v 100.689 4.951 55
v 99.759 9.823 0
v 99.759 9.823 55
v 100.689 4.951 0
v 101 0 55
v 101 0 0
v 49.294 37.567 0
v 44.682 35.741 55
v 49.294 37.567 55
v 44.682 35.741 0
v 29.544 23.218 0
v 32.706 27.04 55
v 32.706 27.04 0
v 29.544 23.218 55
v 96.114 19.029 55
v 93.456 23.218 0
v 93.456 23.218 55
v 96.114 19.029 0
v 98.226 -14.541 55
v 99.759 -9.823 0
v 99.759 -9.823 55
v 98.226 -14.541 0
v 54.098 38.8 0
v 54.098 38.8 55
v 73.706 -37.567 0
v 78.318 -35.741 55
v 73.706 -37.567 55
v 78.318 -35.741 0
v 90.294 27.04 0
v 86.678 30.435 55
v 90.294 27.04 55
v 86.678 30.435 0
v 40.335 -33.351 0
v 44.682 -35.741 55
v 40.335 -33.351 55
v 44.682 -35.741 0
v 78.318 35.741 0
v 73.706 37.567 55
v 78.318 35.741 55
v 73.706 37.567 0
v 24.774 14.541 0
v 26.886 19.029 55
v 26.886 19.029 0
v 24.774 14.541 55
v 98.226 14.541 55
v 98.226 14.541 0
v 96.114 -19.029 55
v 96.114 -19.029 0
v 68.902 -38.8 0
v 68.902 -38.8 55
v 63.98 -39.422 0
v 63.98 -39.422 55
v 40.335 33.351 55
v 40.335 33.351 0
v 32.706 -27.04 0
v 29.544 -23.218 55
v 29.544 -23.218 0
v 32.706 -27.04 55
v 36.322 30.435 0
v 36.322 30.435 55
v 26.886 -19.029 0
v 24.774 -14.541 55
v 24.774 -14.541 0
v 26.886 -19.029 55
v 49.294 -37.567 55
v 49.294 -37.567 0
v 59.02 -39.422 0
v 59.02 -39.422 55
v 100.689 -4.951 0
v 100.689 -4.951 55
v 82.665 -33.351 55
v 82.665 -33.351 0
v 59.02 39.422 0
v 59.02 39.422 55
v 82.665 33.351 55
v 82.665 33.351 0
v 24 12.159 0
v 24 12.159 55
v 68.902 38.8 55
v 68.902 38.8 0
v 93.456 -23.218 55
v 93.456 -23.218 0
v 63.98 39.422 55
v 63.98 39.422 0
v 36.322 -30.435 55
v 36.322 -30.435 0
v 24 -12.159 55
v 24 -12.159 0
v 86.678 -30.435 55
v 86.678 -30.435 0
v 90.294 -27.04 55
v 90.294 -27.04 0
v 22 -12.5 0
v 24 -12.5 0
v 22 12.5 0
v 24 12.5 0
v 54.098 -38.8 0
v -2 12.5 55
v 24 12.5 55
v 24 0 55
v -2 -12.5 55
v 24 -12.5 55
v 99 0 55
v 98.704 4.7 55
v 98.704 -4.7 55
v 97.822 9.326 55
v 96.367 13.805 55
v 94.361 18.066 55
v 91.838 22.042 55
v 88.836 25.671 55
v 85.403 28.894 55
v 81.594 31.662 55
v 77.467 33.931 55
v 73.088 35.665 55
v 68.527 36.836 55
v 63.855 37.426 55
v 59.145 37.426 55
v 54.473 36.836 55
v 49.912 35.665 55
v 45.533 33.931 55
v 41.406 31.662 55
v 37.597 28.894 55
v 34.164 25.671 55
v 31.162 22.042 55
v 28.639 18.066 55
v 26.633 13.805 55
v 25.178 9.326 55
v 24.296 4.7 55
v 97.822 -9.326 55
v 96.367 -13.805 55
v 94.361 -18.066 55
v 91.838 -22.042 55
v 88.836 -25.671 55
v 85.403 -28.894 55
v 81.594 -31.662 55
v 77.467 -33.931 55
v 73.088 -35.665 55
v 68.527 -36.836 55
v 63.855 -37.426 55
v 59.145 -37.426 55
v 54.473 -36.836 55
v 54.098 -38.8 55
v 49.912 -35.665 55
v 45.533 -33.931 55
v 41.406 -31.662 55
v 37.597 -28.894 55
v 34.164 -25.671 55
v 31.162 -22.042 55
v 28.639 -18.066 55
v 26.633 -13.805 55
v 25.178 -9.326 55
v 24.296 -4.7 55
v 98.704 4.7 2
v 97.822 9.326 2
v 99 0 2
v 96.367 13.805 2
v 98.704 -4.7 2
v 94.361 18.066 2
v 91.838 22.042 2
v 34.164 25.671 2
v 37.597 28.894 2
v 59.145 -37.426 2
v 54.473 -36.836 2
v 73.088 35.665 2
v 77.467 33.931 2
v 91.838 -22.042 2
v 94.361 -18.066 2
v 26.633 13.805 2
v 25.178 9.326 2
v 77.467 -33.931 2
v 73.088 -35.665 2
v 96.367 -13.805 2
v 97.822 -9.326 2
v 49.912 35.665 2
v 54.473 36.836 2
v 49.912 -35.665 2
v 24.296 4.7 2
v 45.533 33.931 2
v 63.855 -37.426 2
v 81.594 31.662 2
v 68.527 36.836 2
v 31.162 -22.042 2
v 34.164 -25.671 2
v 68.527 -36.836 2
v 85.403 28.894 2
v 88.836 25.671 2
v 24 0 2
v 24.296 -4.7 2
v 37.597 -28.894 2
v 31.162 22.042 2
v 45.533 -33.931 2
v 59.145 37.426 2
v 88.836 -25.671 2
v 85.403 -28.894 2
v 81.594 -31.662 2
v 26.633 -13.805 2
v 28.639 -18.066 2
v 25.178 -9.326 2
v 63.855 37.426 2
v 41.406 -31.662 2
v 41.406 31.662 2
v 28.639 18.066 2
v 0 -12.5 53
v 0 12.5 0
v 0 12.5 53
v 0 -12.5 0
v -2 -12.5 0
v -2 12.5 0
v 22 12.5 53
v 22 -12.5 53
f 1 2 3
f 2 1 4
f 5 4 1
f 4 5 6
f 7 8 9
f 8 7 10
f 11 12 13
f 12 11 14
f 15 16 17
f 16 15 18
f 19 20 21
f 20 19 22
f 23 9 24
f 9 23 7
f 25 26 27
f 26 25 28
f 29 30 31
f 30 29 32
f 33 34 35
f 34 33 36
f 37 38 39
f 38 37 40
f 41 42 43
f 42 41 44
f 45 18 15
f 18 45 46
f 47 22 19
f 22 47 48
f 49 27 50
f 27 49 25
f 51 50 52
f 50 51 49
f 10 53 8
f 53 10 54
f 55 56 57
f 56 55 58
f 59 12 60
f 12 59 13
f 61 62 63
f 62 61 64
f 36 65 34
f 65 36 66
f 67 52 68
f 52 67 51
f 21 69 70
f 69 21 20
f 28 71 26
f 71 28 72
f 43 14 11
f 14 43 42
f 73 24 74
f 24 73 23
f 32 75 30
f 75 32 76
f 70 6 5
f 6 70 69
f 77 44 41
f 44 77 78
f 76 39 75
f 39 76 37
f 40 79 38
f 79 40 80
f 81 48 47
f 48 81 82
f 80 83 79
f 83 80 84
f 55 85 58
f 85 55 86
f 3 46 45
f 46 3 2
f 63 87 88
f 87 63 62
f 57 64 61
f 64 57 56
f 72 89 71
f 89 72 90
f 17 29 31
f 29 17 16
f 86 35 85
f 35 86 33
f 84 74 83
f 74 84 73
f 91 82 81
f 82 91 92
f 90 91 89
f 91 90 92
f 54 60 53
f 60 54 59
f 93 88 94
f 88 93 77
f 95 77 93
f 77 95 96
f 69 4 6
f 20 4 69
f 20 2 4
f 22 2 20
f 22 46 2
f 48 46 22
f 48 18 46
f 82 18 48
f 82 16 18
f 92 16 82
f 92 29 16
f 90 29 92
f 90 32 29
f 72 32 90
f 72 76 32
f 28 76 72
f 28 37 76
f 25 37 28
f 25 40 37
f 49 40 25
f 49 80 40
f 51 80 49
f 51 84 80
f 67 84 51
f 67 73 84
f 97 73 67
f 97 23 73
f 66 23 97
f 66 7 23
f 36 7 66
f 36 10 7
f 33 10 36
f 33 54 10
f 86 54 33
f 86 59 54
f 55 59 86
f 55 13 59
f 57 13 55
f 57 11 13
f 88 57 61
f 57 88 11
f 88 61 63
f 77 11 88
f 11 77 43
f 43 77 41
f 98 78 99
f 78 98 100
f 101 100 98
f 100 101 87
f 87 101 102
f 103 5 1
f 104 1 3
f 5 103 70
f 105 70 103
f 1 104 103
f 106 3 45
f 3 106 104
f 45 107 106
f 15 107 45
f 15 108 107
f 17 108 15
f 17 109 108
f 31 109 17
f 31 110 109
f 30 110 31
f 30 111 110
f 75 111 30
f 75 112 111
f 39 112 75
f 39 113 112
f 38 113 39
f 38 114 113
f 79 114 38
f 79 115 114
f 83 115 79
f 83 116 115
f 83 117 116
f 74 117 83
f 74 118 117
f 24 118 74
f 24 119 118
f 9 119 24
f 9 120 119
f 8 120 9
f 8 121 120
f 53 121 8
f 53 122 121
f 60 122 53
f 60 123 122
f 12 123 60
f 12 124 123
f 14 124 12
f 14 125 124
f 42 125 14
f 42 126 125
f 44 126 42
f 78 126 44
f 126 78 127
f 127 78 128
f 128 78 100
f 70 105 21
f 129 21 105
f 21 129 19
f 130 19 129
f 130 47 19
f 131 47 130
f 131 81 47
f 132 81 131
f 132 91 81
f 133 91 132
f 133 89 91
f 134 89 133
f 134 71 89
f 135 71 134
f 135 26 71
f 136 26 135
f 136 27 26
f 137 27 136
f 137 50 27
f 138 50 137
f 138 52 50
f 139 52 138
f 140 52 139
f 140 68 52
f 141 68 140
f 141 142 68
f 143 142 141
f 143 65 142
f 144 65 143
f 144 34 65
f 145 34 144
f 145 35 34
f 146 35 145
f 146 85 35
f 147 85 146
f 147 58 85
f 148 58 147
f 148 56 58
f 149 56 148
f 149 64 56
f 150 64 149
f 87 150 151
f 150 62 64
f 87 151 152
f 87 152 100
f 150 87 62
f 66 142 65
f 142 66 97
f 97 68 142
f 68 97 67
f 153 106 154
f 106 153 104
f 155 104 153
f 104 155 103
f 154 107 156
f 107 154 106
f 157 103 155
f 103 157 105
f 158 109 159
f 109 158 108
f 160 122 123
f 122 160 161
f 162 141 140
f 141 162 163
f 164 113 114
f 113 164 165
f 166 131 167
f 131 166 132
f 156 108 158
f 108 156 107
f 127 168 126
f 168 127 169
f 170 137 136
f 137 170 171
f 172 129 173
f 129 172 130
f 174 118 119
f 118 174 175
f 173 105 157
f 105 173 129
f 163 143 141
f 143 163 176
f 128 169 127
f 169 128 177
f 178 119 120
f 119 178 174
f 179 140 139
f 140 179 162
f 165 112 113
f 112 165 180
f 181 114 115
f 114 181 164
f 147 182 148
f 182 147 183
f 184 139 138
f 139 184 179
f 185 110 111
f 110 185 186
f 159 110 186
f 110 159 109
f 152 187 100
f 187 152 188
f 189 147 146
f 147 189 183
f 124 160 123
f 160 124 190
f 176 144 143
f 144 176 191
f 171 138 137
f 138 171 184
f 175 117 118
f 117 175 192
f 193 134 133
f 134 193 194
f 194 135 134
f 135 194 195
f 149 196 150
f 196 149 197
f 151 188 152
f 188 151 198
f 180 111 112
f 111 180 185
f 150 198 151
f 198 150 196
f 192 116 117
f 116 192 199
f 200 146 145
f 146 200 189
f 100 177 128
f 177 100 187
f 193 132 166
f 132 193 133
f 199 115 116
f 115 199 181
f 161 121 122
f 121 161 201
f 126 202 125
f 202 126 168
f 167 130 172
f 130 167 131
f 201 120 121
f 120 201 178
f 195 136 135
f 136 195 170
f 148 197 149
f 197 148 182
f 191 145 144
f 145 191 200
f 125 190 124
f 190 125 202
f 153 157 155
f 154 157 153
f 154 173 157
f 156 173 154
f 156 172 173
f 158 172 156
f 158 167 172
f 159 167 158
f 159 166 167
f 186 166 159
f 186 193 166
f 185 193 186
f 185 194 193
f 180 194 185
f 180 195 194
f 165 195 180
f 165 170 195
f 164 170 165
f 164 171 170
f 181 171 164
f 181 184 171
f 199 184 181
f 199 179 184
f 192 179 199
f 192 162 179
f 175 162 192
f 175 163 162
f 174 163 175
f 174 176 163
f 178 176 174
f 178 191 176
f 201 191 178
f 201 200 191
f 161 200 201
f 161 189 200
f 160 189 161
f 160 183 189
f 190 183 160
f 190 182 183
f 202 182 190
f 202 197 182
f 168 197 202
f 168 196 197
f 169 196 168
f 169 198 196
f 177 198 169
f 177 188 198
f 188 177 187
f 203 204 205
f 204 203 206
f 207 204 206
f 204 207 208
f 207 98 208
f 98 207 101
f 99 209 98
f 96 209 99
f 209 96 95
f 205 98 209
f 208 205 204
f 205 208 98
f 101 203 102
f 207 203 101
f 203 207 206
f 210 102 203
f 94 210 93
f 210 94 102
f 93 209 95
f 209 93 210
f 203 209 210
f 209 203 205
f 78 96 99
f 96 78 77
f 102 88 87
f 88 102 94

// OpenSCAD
$fn = 50;

// Variables
_overallHeight = 55;
_thickness = 2;
_hangerSpace = 22;
_hangerWidth = 25;
_cupDiameter = 75;

//Calculated
_cupPartOD = _cupDiameter+(_thickness*2);

// Hanger Back Part
translate([-_thickness,-_hangerWidth/2,0]) 
  cube([_thickness, _hangerWidth ,_overallHeight]);

// Hanger Top Part
translate([0,-_hangerWidth/2,_overallHeight-_thickness]) 
  cube([_hangerSpace,_hangerWidth,_thickness]);

// Hanger Front Part
translate([_hangerSpace,-_hangerWidth/2,0]) 
  cube([_thickness, _hangerWidth ,_overallHeight]);


// Cup Part
translate([(_cupPartOD/2)+_hangerSpace,0,0]) cupPart();

// cube([_hangerSpace, _hangerWidth/2, _thickness]);


module cupPart () 
{
  difference()
  {
    cylinder(d=_cupPartOD, h=_overallHeight);
    translate([0,0,_thickness]) cylinder(d=_cupDiameter, h=_overallHeight);
  }

}
